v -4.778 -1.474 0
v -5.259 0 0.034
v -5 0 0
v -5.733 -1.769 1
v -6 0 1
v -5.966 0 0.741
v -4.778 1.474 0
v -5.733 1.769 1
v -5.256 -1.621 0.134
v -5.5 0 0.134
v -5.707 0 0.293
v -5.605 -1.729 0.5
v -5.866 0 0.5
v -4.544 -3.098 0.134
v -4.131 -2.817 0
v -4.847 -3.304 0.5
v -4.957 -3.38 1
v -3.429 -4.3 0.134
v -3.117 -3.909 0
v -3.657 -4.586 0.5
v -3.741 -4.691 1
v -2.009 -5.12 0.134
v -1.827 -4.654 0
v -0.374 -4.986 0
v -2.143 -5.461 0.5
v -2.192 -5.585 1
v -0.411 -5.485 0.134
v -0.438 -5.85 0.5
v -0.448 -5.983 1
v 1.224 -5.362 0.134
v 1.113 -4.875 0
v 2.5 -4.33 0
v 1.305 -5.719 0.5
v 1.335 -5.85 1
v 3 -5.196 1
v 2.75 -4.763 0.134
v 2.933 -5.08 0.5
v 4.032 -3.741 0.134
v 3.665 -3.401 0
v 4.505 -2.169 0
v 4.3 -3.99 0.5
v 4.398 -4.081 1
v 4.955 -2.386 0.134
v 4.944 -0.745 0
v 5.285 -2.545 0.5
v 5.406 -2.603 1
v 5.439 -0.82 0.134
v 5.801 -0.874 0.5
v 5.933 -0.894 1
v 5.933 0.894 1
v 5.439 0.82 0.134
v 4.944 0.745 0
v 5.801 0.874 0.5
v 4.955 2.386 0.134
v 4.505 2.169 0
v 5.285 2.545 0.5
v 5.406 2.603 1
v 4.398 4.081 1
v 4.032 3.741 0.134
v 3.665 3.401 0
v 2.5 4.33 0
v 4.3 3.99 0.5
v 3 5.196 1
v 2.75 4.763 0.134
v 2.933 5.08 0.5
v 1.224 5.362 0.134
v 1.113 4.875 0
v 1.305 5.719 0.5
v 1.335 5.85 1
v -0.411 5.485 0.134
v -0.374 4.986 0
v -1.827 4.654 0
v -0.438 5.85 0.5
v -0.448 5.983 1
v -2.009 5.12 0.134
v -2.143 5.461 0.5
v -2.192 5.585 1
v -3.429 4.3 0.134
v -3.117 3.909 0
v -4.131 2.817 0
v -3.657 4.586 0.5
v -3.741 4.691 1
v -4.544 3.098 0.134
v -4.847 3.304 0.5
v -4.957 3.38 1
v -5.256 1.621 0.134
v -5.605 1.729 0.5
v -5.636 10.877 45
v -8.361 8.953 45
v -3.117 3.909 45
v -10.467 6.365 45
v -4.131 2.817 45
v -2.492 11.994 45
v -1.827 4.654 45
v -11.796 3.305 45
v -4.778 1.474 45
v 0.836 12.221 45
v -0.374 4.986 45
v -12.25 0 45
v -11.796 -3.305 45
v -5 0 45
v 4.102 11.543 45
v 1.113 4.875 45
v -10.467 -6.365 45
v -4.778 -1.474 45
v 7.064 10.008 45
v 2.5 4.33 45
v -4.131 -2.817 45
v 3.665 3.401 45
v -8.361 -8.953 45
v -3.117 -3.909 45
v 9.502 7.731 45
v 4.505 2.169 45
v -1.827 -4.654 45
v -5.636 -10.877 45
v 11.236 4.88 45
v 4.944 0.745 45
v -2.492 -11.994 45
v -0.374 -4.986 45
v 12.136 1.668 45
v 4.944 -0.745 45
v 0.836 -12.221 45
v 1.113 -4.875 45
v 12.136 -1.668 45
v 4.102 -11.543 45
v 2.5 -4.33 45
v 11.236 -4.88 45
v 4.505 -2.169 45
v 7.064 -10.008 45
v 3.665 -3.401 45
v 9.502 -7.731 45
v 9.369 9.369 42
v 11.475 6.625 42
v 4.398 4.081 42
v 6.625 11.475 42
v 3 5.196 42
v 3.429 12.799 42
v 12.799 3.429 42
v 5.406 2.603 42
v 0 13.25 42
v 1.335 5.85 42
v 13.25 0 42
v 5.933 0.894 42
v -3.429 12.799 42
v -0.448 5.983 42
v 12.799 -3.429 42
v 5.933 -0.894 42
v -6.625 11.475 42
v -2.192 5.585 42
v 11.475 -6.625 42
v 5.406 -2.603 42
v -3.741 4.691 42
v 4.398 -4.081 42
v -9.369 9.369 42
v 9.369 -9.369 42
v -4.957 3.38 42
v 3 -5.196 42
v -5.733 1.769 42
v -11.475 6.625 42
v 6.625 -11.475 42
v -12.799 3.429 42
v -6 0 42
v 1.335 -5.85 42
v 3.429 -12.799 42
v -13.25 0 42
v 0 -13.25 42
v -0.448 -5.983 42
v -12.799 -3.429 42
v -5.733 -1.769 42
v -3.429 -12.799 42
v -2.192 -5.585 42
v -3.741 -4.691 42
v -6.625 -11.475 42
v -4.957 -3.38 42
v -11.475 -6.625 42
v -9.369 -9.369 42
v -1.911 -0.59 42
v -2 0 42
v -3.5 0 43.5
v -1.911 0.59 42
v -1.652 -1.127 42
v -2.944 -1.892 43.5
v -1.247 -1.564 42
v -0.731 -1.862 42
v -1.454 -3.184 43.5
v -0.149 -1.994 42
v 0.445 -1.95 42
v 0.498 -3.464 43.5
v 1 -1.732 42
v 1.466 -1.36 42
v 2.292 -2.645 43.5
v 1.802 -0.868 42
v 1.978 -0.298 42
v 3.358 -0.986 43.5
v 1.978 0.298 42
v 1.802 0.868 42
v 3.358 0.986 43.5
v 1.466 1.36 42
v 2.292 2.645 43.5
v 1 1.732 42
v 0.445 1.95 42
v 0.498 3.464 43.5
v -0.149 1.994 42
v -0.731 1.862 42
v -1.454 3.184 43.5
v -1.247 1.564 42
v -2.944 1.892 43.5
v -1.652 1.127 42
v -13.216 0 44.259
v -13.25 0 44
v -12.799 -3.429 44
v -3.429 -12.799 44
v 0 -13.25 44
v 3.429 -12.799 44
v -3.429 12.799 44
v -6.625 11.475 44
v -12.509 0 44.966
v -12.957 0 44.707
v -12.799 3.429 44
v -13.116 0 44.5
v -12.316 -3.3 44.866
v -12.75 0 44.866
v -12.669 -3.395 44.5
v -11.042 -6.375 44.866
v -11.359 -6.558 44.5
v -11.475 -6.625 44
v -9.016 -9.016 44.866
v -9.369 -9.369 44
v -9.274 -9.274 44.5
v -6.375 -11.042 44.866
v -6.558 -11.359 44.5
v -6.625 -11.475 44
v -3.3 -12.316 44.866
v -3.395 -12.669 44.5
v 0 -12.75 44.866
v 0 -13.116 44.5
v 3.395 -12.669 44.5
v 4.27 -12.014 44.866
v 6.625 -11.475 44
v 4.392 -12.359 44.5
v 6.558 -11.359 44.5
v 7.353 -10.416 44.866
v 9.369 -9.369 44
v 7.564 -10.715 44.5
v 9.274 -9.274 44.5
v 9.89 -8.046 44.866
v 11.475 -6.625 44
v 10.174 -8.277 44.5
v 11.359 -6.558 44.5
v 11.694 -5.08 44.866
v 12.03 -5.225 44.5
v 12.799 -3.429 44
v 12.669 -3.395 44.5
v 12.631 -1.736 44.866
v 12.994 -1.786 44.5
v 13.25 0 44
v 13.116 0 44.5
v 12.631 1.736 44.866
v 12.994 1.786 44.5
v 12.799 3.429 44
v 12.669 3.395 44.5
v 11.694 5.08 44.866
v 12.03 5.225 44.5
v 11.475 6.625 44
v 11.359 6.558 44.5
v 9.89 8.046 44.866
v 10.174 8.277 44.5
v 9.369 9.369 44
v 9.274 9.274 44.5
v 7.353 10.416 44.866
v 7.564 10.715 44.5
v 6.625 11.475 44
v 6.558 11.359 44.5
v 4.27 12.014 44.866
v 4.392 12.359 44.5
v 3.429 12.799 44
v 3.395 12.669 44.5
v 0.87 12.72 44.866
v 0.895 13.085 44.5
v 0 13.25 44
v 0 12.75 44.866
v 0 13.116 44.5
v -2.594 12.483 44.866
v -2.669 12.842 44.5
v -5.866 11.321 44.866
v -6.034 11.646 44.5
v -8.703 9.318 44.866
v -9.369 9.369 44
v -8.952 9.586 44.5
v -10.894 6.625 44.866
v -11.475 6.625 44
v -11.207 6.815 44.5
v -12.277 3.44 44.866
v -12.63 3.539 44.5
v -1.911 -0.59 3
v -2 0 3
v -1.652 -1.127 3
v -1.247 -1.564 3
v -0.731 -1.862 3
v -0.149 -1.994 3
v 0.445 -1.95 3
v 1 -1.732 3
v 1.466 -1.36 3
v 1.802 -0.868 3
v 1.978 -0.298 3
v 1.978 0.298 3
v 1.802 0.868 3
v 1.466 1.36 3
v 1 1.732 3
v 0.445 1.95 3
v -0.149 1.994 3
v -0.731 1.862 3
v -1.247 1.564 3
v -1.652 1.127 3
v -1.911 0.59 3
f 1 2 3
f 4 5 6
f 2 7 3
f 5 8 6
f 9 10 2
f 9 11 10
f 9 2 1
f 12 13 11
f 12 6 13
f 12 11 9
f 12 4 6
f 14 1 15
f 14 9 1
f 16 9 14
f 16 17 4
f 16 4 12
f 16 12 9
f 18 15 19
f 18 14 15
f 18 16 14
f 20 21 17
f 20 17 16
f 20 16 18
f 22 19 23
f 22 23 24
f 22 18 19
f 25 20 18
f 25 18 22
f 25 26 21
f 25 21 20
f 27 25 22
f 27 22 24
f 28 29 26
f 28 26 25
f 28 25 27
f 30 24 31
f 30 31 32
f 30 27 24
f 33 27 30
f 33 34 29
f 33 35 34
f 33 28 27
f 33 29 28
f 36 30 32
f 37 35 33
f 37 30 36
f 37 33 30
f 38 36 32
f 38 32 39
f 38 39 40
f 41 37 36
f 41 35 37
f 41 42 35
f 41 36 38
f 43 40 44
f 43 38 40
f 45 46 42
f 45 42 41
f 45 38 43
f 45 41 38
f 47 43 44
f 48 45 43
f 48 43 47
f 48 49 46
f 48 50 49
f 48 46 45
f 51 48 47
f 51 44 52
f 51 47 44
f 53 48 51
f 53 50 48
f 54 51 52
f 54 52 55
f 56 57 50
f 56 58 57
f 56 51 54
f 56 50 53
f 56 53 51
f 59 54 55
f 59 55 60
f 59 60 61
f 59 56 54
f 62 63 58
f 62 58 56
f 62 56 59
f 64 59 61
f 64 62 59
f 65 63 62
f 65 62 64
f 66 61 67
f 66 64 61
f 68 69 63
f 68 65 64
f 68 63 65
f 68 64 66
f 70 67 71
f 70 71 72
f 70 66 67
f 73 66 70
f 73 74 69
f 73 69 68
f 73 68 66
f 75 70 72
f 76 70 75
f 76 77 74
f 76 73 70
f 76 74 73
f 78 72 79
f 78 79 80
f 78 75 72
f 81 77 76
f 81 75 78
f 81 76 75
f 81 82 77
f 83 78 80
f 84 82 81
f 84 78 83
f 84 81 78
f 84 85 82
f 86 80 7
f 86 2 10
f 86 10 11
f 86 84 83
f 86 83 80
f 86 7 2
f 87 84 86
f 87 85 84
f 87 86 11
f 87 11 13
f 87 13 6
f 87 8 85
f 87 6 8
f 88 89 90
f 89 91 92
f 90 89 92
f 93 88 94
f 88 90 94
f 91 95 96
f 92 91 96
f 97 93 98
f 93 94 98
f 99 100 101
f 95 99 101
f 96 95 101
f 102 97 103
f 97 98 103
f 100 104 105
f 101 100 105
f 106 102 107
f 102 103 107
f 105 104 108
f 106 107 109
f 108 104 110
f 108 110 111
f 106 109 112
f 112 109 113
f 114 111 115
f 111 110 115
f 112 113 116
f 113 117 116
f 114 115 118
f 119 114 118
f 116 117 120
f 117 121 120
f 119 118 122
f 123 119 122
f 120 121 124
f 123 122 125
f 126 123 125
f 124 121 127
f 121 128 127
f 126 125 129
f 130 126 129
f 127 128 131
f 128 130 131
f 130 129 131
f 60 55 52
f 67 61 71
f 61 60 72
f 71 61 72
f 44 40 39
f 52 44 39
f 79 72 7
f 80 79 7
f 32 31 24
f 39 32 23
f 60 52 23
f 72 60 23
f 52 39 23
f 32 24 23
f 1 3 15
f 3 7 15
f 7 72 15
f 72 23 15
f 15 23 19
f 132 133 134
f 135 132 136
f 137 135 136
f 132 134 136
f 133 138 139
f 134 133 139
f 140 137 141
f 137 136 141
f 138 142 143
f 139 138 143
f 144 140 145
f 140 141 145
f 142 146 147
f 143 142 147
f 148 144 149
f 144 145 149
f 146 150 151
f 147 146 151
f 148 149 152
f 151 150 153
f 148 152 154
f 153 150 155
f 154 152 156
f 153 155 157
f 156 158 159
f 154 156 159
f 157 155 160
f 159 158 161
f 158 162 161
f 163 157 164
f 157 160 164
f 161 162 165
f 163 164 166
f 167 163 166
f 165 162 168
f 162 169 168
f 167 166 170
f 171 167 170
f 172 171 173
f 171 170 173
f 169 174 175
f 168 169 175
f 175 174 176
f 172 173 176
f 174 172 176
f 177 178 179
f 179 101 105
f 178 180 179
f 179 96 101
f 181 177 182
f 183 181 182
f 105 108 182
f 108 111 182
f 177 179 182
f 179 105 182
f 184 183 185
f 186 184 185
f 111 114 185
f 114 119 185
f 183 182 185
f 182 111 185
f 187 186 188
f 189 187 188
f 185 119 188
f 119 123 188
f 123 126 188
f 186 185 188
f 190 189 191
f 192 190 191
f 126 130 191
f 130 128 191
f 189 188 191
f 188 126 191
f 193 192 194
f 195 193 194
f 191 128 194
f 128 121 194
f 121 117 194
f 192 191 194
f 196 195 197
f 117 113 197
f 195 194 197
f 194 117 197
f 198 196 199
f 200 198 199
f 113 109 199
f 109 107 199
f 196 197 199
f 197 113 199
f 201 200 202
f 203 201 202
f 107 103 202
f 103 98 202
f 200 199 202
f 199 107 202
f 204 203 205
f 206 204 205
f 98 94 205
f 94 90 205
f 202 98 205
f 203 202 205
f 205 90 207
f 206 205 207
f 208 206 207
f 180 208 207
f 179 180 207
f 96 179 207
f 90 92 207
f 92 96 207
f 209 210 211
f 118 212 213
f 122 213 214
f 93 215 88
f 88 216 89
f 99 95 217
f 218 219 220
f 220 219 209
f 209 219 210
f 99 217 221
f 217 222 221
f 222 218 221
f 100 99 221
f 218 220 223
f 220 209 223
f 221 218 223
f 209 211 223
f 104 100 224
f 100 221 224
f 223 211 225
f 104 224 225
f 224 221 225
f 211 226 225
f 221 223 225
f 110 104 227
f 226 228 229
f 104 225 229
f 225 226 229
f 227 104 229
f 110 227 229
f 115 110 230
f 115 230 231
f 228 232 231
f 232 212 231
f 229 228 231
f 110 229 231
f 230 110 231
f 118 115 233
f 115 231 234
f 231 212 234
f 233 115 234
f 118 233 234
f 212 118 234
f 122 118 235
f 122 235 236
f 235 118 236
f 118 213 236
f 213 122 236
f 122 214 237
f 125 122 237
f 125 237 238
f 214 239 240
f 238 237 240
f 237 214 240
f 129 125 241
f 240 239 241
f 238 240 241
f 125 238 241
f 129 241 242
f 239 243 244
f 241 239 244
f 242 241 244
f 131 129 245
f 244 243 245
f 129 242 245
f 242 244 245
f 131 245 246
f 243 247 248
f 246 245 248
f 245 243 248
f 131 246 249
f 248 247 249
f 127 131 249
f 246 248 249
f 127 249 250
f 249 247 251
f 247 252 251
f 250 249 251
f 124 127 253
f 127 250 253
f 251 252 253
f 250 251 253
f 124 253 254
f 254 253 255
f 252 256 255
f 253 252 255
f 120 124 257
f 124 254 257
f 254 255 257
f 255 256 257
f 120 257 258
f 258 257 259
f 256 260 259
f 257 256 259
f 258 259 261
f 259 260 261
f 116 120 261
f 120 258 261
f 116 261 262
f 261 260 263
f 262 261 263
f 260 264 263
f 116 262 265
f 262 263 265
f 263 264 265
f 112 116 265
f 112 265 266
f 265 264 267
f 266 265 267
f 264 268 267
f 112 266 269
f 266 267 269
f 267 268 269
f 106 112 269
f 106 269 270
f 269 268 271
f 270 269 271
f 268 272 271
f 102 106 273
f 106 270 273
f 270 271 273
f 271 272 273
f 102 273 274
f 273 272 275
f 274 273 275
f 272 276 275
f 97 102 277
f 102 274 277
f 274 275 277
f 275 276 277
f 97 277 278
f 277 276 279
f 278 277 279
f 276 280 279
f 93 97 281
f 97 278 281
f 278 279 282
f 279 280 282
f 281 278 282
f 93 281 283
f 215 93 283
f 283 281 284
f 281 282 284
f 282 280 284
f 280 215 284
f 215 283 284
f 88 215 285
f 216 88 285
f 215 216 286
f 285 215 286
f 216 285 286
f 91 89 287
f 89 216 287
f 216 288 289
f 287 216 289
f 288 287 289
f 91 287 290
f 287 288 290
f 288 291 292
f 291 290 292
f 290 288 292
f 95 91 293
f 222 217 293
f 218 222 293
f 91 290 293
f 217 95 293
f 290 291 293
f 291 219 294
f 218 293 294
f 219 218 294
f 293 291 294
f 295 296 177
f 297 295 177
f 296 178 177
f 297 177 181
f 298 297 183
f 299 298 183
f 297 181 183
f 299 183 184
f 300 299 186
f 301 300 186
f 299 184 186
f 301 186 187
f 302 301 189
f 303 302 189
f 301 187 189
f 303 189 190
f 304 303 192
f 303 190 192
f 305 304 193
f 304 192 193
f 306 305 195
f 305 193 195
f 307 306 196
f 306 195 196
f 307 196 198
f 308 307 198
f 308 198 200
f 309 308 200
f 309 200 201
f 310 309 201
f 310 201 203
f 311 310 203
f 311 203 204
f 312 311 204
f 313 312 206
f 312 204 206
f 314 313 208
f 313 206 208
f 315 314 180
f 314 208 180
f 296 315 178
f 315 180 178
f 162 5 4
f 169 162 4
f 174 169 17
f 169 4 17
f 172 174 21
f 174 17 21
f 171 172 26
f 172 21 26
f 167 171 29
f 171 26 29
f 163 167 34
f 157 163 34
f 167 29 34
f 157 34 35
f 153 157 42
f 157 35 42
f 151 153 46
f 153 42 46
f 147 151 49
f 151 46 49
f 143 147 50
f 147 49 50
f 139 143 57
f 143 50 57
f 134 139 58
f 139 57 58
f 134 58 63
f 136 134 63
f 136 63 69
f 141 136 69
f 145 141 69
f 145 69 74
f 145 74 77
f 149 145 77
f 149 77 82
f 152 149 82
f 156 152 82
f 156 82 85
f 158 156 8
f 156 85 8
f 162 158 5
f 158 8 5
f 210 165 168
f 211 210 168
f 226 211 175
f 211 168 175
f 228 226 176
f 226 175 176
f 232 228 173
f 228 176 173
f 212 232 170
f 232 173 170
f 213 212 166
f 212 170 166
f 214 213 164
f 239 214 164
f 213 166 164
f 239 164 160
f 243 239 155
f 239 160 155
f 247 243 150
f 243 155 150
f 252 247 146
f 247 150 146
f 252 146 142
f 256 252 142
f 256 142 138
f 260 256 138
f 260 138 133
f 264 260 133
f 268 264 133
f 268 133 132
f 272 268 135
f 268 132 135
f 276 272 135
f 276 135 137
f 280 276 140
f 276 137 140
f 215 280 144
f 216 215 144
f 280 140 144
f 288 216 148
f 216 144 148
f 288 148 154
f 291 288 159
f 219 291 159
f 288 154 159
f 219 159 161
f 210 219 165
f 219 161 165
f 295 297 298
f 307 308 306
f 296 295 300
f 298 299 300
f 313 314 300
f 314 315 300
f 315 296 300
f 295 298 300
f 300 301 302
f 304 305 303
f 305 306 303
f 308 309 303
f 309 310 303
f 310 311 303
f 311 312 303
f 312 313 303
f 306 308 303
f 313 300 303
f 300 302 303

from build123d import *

# Parameters (mm, degrees)
F2_R = 1


with BuildPart() as f1:
    # F0 (on Front) → F1 (revolve)
    with BuildSketch(Plane.XZ):
        Polygon((-6, 0), (0, 0), (0, 3), (-2, 3), (-2, 42), (-5, 45), (-13.25, 45), (-13.25, 42), (-6, 42), align=None)
    revolve(axis=Axis((0, 0, 1.5), (0, 0, 1)))

    # F2
    f2_edges = [f1.edges().sort_by_distance(p)[0] for p in [
        (6, 0, 0),
        (13.25, 0, 45),
    ]]
    fillet(f2_edges, radius=F2_R)


solid = f1.part
